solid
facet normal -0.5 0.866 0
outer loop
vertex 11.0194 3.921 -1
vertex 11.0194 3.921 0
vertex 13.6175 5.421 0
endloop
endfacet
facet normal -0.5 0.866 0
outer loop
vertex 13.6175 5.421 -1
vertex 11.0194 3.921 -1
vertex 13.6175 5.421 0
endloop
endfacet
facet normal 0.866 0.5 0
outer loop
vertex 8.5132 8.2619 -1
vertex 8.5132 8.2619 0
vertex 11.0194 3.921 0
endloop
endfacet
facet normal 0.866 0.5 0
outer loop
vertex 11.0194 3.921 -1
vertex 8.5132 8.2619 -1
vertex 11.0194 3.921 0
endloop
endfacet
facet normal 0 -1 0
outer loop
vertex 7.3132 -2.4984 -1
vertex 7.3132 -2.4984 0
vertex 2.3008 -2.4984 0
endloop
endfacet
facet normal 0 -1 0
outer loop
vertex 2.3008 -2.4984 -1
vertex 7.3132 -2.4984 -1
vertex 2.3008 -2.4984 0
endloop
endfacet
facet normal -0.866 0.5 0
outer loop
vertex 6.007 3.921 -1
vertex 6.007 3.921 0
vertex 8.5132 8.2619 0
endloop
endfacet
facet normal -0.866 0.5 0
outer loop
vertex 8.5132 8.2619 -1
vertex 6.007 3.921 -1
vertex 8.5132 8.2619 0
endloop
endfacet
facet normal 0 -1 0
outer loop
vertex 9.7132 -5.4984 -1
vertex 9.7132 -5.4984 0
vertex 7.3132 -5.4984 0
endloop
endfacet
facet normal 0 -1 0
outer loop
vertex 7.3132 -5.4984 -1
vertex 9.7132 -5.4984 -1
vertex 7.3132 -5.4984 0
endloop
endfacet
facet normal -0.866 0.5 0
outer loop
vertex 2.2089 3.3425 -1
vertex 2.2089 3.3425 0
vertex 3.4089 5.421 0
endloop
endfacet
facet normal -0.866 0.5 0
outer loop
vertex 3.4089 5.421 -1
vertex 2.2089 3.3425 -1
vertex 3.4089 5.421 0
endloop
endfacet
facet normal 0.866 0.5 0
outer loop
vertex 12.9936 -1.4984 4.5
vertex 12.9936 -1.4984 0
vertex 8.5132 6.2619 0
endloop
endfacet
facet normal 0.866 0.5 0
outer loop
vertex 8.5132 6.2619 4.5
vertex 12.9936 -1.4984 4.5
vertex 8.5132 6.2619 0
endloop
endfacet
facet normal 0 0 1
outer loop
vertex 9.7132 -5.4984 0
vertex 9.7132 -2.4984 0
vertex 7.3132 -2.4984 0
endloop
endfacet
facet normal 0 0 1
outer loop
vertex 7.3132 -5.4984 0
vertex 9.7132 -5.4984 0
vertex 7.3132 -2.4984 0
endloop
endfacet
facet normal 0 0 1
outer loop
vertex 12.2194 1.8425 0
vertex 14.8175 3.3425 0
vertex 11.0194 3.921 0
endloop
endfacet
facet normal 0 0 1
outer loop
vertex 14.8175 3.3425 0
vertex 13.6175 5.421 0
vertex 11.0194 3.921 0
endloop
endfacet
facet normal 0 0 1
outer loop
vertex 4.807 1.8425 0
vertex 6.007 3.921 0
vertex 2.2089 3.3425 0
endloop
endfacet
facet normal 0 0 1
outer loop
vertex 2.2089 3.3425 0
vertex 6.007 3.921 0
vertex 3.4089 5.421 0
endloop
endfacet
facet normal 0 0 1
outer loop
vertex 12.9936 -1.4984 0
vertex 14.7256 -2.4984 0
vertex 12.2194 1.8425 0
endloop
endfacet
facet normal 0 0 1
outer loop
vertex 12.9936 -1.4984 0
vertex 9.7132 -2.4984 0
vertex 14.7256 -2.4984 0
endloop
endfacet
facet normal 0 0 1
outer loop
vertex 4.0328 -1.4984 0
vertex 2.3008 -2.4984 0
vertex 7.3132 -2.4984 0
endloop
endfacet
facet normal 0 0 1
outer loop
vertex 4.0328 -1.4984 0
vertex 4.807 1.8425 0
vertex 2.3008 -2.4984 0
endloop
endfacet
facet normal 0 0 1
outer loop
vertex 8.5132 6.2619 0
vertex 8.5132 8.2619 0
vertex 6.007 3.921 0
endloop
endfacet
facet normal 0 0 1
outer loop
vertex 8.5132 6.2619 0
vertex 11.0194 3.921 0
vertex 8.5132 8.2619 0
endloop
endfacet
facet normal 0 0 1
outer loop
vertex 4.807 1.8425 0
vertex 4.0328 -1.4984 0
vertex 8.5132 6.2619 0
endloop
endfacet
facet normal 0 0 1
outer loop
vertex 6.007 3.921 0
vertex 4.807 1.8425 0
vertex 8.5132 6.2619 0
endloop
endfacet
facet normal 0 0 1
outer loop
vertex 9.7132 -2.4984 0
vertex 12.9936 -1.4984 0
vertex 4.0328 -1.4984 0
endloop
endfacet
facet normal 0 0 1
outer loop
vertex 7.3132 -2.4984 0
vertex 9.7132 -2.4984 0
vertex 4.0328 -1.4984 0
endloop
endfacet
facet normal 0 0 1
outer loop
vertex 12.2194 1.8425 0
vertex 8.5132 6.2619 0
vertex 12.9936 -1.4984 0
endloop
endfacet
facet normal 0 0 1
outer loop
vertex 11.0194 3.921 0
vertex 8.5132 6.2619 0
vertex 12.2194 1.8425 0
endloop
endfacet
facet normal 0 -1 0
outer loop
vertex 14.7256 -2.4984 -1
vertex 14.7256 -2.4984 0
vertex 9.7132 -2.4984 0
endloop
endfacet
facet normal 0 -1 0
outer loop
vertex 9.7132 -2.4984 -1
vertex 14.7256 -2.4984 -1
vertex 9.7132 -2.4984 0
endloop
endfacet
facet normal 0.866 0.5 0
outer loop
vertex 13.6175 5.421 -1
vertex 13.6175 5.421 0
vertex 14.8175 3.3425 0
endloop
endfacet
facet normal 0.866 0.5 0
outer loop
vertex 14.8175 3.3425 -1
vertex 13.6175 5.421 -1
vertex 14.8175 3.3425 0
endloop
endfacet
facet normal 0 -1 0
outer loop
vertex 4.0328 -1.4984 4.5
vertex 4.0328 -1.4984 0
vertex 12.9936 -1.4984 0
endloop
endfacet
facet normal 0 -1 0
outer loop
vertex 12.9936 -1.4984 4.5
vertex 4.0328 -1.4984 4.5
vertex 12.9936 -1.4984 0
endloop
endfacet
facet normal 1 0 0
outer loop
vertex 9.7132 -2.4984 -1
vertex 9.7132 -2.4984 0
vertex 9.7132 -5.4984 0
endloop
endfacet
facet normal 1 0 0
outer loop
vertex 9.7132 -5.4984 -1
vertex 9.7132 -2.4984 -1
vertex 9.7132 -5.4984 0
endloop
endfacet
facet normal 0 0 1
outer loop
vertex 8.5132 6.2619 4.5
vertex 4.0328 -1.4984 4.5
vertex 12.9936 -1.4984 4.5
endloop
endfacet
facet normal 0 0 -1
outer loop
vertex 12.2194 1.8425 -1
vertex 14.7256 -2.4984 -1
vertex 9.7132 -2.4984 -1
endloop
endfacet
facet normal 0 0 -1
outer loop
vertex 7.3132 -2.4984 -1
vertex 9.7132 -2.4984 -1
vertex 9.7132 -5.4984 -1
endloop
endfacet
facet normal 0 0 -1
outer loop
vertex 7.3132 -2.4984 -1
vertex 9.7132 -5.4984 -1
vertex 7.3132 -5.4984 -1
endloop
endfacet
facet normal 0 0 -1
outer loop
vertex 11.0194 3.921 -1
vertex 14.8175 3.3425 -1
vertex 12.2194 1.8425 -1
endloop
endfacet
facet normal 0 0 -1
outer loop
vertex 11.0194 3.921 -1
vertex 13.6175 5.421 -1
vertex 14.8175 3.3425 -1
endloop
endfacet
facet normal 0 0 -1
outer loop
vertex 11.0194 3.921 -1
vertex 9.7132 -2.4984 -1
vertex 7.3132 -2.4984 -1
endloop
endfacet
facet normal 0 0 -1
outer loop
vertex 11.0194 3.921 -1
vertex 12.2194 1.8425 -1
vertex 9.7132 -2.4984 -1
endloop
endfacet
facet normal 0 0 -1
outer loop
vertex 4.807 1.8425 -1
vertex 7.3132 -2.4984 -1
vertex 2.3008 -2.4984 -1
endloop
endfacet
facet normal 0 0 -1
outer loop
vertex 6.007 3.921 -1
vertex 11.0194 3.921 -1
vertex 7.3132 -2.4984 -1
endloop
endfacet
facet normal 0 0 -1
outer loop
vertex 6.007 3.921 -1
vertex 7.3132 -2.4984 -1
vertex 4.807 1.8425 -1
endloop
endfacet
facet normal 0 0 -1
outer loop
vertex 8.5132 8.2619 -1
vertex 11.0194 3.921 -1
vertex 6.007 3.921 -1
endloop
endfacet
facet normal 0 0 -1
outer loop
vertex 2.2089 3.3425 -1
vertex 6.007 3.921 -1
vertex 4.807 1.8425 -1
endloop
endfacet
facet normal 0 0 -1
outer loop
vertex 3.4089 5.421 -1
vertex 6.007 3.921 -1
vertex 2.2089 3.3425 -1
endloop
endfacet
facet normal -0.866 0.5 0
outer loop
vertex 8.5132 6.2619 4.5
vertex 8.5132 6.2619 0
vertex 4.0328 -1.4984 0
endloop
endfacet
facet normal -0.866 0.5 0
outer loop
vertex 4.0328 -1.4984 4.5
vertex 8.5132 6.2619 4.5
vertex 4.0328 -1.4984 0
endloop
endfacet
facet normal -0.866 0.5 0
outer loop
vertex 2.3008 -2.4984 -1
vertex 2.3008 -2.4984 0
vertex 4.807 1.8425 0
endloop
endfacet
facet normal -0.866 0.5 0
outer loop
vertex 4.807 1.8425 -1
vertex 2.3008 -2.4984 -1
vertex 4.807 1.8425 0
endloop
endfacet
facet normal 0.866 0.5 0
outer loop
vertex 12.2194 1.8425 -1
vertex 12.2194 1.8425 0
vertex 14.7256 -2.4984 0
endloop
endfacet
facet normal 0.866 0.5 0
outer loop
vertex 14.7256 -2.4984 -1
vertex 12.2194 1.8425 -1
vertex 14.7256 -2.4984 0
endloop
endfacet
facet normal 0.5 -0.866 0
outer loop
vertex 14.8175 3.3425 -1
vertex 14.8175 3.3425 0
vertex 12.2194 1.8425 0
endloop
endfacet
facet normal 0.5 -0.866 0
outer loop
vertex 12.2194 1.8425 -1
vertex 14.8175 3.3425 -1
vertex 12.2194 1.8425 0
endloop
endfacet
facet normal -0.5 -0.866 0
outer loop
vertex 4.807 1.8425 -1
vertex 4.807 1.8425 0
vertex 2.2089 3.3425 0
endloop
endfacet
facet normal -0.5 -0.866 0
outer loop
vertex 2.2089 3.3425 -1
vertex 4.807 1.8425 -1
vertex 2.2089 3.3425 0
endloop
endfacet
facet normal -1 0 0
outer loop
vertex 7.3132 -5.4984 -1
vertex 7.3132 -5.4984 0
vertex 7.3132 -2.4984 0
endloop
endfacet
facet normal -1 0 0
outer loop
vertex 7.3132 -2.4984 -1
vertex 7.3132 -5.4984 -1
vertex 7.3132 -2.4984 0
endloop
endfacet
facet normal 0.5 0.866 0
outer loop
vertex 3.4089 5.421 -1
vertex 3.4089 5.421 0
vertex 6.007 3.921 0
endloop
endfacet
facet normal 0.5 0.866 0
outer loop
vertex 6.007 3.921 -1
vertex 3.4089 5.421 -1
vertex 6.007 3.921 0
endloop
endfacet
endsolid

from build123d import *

# Parameters (mm, degrees)
BOSS_EXTRUDE1_DEPTH = 4.5
BOSS_EXTRUDE2_DEPTH = 1


with BuildPart() as part:
    # Sketch1 → Boss-Extrude1 (new body)
    with BuildSketch(Plane.XY):
        Polygon((4.032829212, -1.498375708), (12.993598728, -1.498375708), (8.51321397, 6.26187833), align=None)
    extrude(amount=BOSS_EXTRUDE1_DEPTH)

    # Sketch2 → Boss-Extrude2 (add)
    with BuildSketch(Plane(origin=(0, 0, 0), x_dir=(-1, 0, 0), z_dir=(0, 0, -1))):
        Polygon((-14.817507964, 3.342520827), (-12.219431753, 1.842520827), (-14.725649535, -2.498375708), (-9.71321397, -2.498375708), (-9.71321397, -5.498375708), (-7.31321397, -5.498375708), (-7.31321397, -2.498375708), (-2.300778405, -2.498375708), (-4.806996187, 1.842520827), (-2.208919976, 3.342520827), (-3.408919976, 5.420981796), (-6.006996187, 3.920981796), (-8.51321397, 8.26187833), (-11.019431753, 3.920981796), (-13.617507964, 5.420981796), align=None)
    extrude(amount=BOSS_EXTRUDE2_DEPTH)


solid = part.part
